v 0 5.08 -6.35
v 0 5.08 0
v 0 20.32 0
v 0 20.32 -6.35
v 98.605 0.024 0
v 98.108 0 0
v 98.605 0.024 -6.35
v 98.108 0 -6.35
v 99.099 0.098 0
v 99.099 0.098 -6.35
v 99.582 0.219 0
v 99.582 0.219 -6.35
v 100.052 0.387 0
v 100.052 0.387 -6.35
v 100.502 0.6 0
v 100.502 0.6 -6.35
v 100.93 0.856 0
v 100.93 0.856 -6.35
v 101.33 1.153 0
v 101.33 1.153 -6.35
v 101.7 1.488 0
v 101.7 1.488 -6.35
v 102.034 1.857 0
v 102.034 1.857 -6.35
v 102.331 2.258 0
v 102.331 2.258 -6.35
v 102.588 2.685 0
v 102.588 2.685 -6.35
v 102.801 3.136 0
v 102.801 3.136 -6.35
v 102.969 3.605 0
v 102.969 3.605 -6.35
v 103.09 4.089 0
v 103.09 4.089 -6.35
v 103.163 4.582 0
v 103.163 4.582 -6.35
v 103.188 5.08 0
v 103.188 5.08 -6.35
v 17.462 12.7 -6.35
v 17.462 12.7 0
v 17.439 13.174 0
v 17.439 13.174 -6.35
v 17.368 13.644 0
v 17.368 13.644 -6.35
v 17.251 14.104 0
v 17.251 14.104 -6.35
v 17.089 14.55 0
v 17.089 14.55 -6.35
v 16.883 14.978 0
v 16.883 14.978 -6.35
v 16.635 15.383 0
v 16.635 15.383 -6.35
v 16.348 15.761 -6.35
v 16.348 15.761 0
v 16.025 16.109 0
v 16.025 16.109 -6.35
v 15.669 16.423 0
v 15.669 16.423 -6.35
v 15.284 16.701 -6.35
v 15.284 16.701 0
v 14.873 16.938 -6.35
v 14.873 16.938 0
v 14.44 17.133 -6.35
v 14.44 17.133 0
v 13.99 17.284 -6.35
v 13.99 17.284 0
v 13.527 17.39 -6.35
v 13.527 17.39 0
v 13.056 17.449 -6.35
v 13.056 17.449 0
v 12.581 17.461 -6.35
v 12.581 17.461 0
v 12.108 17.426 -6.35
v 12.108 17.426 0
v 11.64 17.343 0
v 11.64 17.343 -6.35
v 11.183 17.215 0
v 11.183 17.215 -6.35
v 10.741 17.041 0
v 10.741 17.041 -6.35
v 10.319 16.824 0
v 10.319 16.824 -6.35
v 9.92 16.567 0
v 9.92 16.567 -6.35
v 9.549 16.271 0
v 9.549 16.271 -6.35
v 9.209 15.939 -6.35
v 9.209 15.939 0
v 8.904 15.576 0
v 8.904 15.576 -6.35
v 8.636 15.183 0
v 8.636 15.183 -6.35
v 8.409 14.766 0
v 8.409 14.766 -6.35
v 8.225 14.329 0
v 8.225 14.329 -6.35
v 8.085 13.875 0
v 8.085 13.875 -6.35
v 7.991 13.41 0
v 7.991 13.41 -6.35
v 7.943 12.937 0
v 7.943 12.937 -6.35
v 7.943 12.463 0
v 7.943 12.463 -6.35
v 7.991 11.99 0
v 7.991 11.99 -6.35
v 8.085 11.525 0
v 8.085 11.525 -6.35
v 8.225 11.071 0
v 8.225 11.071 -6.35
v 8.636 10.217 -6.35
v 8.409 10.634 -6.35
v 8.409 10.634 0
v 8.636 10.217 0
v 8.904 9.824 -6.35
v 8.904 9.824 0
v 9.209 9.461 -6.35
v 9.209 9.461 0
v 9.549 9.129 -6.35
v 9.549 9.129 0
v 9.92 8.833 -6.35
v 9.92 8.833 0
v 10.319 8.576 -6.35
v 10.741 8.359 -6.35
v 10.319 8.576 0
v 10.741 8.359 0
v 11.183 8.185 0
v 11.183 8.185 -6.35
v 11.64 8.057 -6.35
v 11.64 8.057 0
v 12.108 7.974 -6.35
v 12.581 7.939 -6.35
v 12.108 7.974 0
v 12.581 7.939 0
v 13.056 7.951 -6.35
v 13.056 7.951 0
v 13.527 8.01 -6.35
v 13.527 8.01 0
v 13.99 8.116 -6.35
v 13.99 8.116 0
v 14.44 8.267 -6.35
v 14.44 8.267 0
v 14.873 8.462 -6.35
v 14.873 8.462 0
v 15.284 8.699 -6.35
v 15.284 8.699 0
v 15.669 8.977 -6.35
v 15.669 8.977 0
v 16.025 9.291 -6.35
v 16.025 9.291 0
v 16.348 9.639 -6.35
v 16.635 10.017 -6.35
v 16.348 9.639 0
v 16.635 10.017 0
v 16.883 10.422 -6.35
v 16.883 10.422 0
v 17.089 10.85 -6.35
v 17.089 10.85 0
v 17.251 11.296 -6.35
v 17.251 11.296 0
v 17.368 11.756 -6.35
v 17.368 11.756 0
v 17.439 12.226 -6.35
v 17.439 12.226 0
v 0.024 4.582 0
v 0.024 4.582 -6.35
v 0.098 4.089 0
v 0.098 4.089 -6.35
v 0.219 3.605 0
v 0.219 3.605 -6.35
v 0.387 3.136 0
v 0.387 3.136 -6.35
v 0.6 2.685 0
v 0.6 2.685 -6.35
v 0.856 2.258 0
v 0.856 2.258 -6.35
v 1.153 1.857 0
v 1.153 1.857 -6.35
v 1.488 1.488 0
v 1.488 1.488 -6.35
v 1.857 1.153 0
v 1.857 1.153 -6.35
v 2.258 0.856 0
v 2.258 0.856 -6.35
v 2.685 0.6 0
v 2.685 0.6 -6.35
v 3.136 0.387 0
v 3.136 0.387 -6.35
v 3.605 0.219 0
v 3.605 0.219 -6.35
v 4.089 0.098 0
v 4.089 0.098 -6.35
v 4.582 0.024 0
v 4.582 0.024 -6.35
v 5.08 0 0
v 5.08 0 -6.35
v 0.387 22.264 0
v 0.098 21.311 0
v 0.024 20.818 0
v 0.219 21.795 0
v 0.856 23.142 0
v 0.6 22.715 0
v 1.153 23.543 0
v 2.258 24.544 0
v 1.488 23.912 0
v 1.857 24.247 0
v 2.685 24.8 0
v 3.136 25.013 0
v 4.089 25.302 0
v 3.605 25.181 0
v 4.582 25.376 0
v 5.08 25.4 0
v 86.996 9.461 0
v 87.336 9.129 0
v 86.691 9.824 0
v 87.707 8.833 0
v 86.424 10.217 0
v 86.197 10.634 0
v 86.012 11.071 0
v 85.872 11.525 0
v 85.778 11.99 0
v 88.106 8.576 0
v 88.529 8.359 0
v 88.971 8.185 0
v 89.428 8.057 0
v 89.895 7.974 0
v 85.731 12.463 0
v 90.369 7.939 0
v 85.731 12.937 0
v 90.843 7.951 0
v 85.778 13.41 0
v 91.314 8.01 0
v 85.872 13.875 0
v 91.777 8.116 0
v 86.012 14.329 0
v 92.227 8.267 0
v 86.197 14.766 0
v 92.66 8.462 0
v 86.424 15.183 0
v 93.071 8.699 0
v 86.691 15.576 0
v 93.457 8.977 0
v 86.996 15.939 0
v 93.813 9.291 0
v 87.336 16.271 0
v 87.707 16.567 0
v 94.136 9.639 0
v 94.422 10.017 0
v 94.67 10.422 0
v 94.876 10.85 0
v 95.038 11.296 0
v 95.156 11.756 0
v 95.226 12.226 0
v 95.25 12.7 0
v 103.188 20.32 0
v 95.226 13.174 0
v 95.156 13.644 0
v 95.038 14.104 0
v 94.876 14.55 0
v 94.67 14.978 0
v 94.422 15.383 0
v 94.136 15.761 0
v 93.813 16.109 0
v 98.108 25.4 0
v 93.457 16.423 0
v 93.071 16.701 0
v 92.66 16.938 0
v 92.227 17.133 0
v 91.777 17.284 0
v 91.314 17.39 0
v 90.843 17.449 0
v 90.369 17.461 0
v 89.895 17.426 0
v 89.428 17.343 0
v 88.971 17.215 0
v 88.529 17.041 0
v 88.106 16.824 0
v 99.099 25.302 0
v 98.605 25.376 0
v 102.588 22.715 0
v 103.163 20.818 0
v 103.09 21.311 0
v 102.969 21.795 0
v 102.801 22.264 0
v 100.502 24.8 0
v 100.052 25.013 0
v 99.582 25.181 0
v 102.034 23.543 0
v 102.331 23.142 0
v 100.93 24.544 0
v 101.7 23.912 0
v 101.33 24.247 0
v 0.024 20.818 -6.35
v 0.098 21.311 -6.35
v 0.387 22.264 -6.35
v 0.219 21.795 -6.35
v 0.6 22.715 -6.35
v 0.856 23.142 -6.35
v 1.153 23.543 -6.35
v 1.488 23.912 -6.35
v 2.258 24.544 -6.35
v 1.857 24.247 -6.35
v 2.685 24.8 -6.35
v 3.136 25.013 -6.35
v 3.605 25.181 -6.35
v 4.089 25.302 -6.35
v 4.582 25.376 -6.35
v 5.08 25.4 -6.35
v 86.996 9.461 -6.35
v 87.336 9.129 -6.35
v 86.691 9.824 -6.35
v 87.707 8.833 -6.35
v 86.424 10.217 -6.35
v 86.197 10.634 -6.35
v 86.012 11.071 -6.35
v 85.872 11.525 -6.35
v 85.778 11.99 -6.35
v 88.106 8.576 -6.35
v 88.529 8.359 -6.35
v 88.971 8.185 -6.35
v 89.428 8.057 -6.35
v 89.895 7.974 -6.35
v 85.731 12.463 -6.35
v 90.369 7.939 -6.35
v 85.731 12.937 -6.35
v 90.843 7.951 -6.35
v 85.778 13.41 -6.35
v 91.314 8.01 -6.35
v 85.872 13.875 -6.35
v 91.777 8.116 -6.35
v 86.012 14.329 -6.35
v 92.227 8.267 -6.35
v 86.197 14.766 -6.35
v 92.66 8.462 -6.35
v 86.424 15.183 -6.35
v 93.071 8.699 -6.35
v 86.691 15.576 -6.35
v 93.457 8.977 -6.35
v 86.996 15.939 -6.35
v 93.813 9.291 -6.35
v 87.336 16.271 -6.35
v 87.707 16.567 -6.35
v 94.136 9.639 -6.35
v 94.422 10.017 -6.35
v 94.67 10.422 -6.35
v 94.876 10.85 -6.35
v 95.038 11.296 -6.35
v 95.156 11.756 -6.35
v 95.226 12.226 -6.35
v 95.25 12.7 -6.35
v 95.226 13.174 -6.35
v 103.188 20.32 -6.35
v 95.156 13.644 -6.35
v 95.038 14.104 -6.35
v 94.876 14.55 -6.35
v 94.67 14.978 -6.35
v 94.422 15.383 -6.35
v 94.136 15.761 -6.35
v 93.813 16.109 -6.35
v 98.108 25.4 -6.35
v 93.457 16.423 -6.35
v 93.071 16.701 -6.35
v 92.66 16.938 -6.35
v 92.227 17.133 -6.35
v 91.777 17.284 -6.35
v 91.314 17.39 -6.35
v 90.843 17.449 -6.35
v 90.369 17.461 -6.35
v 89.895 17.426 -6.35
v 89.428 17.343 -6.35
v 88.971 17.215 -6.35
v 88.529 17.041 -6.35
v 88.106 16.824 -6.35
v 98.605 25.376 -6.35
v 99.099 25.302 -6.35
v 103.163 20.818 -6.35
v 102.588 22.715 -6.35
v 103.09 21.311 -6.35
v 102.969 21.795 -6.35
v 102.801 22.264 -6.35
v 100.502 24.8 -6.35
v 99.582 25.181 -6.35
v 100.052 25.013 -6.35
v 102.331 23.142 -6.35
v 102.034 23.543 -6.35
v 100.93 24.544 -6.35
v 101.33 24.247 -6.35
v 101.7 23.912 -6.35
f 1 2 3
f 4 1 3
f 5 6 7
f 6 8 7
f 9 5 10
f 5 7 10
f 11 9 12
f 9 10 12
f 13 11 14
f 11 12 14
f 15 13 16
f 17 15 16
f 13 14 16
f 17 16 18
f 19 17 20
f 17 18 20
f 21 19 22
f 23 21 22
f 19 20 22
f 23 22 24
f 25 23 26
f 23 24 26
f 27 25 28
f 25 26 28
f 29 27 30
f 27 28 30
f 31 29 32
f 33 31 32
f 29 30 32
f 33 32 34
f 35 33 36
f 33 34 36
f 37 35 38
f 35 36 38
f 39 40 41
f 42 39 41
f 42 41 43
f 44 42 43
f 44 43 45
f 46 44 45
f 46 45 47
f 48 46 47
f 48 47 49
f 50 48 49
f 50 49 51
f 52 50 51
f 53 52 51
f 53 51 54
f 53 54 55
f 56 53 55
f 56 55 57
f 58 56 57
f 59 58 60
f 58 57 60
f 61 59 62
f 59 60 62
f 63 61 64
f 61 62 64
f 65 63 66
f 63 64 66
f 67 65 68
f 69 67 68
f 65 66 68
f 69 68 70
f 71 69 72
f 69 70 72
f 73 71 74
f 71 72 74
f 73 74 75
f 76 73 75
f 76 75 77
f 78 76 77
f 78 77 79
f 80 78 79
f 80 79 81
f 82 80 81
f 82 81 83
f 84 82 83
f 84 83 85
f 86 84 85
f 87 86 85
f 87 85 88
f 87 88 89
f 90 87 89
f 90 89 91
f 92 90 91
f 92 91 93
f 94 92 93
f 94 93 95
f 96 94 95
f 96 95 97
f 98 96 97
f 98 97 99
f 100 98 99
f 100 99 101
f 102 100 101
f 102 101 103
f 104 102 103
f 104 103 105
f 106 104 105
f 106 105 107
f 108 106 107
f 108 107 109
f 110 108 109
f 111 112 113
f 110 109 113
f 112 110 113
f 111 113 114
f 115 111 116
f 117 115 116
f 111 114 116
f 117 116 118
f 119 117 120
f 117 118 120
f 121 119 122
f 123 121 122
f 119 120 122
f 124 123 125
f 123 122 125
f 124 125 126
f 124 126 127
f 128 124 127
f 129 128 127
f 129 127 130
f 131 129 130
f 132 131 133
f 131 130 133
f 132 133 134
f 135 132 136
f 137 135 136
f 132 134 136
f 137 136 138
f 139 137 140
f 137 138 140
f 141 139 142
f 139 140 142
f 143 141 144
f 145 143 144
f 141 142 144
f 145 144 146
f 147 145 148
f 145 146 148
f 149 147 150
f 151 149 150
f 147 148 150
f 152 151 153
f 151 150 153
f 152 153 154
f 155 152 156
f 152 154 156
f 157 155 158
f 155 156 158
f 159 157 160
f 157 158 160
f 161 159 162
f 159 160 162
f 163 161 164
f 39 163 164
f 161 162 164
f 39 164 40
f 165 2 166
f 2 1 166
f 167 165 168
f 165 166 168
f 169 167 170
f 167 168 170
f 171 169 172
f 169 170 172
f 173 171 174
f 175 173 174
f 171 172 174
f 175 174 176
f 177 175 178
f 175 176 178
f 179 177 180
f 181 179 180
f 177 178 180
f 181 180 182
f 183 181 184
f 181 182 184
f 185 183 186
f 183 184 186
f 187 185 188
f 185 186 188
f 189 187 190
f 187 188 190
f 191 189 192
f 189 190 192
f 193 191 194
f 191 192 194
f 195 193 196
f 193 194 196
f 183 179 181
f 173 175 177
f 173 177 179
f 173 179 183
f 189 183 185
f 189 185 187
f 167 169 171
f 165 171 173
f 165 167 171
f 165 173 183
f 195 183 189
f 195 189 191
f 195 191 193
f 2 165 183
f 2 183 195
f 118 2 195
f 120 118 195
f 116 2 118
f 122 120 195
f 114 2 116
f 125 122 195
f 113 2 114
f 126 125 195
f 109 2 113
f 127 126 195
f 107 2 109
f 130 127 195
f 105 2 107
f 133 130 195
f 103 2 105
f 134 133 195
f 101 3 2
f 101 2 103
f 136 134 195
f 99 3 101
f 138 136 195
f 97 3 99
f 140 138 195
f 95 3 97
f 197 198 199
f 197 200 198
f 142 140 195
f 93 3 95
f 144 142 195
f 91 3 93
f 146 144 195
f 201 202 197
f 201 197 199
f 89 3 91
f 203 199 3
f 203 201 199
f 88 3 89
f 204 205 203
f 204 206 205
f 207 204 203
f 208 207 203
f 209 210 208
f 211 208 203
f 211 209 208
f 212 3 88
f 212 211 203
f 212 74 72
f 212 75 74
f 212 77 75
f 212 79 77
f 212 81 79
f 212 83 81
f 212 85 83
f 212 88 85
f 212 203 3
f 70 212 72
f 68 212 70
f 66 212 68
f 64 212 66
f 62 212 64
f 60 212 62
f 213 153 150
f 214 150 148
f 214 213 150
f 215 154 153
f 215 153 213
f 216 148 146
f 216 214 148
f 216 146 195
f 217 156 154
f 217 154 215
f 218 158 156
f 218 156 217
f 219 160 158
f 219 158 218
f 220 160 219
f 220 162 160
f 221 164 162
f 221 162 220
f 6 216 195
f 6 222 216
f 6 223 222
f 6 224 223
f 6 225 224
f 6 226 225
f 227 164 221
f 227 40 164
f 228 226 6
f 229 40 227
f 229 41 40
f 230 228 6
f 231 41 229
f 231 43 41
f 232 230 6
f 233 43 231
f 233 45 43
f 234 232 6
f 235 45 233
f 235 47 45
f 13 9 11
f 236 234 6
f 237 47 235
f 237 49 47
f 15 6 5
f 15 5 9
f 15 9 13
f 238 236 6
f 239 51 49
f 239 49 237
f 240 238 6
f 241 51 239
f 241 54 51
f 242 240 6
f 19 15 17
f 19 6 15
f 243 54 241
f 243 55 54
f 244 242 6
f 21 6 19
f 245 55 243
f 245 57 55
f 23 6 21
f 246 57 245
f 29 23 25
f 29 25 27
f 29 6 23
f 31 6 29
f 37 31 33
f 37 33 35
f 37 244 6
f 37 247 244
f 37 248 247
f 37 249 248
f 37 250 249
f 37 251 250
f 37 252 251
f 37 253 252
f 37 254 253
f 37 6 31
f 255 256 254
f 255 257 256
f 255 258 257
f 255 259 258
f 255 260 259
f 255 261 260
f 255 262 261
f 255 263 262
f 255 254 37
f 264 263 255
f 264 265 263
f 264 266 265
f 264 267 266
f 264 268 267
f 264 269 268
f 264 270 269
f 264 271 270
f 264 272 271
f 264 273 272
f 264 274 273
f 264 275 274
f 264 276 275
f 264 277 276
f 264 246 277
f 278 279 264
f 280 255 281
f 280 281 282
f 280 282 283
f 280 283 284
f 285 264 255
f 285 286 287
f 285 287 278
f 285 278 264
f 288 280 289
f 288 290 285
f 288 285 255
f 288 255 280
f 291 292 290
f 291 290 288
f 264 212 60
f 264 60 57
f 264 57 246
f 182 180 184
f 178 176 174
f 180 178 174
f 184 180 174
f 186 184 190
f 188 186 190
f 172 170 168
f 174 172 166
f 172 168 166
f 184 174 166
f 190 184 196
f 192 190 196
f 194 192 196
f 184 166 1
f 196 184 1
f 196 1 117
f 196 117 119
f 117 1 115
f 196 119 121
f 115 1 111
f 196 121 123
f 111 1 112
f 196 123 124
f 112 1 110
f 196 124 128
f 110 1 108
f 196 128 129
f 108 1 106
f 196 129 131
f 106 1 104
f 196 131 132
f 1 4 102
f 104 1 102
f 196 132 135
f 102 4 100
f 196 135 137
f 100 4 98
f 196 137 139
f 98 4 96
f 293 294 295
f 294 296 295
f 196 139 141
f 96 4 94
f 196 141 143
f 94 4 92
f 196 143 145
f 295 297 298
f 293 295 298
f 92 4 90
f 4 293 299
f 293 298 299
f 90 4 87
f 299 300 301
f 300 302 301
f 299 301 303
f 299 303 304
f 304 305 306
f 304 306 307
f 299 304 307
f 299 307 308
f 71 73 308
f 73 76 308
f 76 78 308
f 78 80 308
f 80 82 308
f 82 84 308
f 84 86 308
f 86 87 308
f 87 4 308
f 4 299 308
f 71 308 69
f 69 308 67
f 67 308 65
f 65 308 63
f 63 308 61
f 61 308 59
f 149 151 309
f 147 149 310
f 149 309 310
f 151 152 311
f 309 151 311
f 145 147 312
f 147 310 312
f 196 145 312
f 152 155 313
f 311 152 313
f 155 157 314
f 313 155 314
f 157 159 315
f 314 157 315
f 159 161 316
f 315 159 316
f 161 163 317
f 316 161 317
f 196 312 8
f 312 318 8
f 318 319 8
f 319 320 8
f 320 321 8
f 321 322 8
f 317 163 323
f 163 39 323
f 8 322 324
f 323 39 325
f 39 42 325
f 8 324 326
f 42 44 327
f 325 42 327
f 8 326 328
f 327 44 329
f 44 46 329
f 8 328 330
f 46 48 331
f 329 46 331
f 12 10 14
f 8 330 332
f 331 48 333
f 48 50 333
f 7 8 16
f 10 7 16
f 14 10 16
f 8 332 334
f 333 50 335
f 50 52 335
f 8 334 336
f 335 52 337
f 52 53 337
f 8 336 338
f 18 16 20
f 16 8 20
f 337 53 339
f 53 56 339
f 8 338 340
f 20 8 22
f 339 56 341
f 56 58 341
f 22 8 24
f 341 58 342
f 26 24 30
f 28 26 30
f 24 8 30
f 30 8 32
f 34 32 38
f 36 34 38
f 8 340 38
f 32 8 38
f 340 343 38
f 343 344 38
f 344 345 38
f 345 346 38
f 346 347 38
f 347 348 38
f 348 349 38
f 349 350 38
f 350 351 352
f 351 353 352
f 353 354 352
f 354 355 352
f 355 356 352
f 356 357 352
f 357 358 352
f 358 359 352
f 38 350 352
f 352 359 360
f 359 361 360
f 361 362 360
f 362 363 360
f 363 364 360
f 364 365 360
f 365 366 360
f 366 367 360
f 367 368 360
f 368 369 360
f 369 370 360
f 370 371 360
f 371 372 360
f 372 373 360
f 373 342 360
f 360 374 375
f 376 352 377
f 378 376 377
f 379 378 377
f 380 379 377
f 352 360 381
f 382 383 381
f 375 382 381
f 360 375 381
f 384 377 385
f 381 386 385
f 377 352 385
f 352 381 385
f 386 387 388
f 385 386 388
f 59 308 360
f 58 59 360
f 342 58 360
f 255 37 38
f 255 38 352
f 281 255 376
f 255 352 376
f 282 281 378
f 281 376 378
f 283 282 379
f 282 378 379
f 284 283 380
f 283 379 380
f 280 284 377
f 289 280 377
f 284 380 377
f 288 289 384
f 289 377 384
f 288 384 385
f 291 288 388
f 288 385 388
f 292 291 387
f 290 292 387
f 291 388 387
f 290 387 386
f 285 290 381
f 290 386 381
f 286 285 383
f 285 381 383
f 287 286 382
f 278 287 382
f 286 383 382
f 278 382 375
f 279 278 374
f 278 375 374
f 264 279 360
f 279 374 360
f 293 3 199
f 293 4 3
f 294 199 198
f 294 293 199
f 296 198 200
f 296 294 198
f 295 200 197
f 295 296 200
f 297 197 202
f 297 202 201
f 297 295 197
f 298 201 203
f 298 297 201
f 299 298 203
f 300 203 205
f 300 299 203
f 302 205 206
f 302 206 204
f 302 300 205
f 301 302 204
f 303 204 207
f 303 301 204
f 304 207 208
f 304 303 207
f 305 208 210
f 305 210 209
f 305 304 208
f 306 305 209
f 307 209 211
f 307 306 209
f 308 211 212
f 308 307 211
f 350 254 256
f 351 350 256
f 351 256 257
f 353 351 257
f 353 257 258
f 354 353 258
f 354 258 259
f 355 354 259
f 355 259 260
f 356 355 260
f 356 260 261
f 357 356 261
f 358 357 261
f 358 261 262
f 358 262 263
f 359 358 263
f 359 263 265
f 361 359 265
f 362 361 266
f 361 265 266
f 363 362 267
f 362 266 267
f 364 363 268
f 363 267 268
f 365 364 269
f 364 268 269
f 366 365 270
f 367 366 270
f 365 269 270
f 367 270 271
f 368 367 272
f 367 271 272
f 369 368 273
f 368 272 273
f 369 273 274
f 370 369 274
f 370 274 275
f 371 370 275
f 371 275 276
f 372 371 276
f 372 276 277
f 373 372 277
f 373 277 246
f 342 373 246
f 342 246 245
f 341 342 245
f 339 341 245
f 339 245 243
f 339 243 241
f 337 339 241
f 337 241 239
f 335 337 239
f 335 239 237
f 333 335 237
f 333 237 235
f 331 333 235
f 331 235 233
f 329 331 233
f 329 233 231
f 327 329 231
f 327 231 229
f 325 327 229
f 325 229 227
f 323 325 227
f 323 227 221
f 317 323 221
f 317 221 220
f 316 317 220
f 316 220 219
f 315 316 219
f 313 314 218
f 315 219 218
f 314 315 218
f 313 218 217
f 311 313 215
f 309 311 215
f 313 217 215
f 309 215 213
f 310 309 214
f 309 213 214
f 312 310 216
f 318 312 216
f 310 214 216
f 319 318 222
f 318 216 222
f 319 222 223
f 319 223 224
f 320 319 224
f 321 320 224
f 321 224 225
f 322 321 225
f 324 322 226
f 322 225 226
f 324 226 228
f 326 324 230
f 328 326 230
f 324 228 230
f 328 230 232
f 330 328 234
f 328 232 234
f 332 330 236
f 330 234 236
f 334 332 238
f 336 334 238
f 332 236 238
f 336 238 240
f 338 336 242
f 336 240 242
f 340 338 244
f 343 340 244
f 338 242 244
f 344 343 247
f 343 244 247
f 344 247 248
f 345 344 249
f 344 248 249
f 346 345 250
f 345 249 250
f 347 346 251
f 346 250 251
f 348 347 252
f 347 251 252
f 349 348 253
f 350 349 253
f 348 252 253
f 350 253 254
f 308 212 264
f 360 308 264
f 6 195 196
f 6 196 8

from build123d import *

# Parameters (mm, degrees)
SKETCH1_W           = 103.1875
SKETCH1_H           = 25.4
BOSS_EXTRUDE1_DEPTH = 6.35
FILLET1_R           = 5.08
SKETCH2_R           = 4.7625
CUT_EXTRUDE1_DEPTH  = 107.457233931


with BuildPart() as part:
    # Sketch1 → Boss-Extrude1 (new body)
    with BuildSketch(Plane.XY):
        with Locations((51.59375, 12.7)):
            Rectangle(SKETCH1_W, SKETCH1_H)
    extrude(amount=-BOSS_EXTRUDE1_DEPTH)

    # Fillet1
    fillet1_edges = [part.edges().sort_by_distance(p)[0] for p in [
        (0, 25.4, -3.175),
        (103.1875, 25.4, -3.175),
        (103.1875, 0, -3.175),
        (0, 0, -3.175),
    ]]
    fillet(fillet1_edges, radius=FILLET1_R)

    # Sketch2 → Cut-Extrude1 (cut, through all)
    with BuildSketch(Plane.XY):
        with Locations((12.7, 12.7)):
            Circle(SKETCH2_R)
        with Locations((90.4875, 12.7)):
            Circle(SKETCH2_R)
    extrude(amount=-CUT_EXTRUDE1_DEPTH, mode=Mode.SUBTRACT)


solid = part.part
